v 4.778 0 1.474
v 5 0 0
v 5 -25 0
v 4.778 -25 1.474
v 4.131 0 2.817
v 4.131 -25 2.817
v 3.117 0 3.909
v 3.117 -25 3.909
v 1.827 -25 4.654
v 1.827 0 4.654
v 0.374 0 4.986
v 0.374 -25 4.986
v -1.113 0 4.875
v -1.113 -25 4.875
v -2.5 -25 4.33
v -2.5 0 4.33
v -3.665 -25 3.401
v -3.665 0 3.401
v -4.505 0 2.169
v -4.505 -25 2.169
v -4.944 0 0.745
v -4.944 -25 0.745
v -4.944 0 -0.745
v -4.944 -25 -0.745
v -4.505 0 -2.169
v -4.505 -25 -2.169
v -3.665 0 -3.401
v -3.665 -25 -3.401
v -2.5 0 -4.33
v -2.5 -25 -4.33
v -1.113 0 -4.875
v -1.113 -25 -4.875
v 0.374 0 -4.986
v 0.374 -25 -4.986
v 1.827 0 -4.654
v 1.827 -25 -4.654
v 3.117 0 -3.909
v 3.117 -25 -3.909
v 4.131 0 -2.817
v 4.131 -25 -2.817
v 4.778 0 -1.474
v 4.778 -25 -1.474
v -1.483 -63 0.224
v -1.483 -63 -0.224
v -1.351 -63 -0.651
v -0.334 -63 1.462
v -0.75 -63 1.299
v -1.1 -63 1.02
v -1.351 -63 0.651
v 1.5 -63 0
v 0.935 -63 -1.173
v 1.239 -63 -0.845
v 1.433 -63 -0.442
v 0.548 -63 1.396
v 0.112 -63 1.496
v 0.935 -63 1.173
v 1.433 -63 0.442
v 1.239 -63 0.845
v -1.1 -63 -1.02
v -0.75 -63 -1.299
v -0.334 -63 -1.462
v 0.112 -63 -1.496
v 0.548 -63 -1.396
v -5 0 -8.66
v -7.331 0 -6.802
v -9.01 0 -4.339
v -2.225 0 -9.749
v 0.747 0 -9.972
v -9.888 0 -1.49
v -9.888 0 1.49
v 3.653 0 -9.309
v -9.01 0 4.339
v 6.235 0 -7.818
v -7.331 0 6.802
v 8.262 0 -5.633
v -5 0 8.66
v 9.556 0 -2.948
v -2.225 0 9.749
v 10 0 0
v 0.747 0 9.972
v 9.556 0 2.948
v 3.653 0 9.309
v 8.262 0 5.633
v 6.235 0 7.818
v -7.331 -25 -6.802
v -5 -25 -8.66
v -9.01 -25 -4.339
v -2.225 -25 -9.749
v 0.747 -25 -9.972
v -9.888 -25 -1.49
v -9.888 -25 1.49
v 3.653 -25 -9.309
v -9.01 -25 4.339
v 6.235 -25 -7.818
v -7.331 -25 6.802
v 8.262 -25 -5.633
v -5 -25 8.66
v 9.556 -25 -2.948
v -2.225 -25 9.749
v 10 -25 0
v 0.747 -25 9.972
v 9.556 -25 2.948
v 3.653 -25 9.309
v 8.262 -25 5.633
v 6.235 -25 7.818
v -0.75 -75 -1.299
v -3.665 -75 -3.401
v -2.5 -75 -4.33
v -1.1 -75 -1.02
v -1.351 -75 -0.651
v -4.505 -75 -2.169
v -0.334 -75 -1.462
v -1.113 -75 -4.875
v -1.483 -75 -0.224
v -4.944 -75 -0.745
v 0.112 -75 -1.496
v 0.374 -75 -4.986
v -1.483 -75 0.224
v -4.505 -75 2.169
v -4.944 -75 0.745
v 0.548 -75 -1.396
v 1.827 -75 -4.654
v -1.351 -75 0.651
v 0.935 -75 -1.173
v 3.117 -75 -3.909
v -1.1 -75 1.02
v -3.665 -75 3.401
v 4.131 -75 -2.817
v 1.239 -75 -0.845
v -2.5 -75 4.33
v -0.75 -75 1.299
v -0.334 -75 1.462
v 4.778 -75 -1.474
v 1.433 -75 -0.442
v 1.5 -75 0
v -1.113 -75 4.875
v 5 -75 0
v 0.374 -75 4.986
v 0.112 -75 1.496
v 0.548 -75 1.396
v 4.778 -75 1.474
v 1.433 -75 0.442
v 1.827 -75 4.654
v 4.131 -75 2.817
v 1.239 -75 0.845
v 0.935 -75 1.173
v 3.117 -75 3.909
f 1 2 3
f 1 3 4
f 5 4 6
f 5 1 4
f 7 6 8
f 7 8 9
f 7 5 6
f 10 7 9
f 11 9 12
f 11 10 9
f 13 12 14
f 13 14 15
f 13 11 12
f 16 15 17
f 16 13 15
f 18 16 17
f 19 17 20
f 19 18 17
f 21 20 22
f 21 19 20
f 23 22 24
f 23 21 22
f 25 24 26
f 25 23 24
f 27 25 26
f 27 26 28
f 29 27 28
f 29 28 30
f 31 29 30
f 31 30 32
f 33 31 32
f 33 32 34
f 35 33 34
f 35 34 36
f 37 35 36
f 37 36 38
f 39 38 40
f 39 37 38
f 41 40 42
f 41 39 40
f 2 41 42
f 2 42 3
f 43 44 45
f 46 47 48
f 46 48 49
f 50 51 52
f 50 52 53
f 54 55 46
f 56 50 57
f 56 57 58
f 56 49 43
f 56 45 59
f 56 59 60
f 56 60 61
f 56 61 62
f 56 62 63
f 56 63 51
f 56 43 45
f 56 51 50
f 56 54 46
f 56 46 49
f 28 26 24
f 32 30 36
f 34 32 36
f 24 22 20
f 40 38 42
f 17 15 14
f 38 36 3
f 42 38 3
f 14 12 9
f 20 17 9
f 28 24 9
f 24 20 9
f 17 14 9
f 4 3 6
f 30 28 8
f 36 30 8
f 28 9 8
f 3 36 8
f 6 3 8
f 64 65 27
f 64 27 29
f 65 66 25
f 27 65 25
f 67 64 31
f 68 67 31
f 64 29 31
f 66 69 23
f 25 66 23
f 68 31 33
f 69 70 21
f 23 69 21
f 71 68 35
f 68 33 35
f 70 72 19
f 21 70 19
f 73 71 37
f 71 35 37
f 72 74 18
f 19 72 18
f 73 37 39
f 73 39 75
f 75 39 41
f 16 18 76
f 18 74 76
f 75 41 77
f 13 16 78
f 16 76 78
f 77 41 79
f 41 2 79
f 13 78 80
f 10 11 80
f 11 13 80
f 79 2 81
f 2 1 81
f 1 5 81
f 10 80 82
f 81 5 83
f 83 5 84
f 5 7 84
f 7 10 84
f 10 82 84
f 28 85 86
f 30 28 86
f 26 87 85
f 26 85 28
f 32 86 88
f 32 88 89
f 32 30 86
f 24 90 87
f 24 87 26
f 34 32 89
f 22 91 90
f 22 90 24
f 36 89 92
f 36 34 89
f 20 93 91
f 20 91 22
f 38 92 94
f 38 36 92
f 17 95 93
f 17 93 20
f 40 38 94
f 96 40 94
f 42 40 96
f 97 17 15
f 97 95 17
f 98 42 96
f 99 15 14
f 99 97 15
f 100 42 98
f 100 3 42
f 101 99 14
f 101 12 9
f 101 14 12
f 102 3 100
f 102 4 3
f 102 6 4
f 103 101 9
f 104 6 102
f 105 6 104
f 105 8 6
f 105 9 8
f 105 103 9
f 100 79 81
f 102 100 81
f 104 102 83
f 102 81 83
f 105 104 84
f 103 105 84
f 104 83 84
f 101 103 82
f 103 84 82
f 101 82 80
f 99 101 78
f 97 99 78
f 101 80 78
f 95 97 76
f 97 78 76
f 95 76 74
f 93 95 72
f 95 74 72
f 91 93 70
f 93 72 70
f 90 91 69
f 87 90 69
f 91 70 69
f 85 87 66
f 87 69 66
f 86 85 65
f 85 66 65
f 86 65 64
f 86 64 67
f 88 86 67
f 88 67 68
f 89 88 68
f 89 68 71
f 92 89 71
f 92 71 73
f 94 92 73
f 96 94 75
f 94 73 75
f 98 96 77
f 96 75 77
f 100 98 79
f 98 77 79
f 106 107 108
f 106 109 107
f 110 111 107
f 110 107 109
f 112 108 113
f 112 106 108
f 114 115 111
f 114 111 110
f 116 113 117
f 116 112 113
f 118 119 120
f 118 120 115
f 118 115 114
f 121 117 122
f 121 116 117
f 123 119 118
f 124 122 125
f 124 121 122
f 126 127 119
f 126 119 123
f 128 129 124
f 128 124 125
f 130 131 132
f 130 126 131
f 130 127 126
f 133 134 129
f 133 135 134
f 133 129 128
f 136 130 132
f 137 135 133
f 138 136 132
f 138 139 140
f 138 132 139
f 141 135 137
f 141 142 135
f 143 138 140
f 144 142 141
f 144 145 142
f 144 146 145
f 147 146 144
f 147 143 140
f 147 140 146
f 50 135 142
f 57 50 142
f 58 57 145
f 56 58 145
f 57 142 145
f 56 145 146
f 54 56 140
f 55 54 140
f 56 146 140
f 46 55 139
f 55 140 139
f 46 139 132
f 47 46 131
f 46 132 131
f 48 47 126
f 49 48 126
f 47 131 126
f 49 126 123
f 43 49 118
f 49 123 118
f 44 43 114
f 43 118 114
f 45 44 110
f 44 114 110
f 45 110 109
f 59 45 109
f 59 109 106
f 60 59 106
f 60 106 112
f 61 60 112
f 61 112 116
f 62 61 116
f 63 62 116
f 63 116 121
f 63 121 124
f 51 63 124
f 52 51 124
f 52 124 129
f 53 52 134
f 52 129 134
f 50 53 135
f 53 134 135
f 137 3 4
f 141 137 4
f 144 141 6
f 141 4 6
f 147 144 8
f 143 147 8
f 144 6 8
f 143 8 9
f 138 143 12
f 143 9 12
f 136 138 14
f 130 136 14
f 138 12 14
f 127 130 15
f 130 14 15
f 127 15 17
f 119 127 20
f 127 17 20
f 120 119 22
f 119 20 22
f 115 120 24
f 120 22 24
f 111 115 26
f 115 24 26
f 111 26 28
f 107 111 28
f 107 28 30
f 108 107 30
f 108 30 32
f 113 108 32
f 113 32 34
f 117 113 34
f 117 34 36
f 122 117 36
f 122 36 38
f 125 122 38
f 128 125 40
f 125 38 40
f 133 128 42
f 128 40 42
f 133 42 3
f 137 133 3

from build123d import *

# Parameters (mm, degrees)
F0_R     = 10
F0_R_2   = 5
F1_DEPTH = 25
F2_R     = 5
F3_DEPTH = 50
F4_R     = 1.5
F5_DEPTH = 12


with BuildPart() as f1:
    # F0 (on Front) → F1 (new body)
    with BuildSketch(Plane.XZ):
        Circle(F0_R)
        Circle(F0_R_2, mode=Mode.SUBTRACT)
    extrude(amount=F1_DEPTH)


with BuildPart() as f3:
    # F2 (on face) → F3 (new body)
    with BuildSketch(Plane.XZ.offset(25)):
        Circle(F2_R)
    extrude(amount=F3_DEPTH)

    # F4 (on face) → F5 (cut)
    with BuildSketch(Plane.XZ.offset(75)):
        Circle(F4_R)
    extrude(amount=-F5_DEPTH, mode=Mode.SUBTRACT)


solid = Compound([f1.part, f3.part])
